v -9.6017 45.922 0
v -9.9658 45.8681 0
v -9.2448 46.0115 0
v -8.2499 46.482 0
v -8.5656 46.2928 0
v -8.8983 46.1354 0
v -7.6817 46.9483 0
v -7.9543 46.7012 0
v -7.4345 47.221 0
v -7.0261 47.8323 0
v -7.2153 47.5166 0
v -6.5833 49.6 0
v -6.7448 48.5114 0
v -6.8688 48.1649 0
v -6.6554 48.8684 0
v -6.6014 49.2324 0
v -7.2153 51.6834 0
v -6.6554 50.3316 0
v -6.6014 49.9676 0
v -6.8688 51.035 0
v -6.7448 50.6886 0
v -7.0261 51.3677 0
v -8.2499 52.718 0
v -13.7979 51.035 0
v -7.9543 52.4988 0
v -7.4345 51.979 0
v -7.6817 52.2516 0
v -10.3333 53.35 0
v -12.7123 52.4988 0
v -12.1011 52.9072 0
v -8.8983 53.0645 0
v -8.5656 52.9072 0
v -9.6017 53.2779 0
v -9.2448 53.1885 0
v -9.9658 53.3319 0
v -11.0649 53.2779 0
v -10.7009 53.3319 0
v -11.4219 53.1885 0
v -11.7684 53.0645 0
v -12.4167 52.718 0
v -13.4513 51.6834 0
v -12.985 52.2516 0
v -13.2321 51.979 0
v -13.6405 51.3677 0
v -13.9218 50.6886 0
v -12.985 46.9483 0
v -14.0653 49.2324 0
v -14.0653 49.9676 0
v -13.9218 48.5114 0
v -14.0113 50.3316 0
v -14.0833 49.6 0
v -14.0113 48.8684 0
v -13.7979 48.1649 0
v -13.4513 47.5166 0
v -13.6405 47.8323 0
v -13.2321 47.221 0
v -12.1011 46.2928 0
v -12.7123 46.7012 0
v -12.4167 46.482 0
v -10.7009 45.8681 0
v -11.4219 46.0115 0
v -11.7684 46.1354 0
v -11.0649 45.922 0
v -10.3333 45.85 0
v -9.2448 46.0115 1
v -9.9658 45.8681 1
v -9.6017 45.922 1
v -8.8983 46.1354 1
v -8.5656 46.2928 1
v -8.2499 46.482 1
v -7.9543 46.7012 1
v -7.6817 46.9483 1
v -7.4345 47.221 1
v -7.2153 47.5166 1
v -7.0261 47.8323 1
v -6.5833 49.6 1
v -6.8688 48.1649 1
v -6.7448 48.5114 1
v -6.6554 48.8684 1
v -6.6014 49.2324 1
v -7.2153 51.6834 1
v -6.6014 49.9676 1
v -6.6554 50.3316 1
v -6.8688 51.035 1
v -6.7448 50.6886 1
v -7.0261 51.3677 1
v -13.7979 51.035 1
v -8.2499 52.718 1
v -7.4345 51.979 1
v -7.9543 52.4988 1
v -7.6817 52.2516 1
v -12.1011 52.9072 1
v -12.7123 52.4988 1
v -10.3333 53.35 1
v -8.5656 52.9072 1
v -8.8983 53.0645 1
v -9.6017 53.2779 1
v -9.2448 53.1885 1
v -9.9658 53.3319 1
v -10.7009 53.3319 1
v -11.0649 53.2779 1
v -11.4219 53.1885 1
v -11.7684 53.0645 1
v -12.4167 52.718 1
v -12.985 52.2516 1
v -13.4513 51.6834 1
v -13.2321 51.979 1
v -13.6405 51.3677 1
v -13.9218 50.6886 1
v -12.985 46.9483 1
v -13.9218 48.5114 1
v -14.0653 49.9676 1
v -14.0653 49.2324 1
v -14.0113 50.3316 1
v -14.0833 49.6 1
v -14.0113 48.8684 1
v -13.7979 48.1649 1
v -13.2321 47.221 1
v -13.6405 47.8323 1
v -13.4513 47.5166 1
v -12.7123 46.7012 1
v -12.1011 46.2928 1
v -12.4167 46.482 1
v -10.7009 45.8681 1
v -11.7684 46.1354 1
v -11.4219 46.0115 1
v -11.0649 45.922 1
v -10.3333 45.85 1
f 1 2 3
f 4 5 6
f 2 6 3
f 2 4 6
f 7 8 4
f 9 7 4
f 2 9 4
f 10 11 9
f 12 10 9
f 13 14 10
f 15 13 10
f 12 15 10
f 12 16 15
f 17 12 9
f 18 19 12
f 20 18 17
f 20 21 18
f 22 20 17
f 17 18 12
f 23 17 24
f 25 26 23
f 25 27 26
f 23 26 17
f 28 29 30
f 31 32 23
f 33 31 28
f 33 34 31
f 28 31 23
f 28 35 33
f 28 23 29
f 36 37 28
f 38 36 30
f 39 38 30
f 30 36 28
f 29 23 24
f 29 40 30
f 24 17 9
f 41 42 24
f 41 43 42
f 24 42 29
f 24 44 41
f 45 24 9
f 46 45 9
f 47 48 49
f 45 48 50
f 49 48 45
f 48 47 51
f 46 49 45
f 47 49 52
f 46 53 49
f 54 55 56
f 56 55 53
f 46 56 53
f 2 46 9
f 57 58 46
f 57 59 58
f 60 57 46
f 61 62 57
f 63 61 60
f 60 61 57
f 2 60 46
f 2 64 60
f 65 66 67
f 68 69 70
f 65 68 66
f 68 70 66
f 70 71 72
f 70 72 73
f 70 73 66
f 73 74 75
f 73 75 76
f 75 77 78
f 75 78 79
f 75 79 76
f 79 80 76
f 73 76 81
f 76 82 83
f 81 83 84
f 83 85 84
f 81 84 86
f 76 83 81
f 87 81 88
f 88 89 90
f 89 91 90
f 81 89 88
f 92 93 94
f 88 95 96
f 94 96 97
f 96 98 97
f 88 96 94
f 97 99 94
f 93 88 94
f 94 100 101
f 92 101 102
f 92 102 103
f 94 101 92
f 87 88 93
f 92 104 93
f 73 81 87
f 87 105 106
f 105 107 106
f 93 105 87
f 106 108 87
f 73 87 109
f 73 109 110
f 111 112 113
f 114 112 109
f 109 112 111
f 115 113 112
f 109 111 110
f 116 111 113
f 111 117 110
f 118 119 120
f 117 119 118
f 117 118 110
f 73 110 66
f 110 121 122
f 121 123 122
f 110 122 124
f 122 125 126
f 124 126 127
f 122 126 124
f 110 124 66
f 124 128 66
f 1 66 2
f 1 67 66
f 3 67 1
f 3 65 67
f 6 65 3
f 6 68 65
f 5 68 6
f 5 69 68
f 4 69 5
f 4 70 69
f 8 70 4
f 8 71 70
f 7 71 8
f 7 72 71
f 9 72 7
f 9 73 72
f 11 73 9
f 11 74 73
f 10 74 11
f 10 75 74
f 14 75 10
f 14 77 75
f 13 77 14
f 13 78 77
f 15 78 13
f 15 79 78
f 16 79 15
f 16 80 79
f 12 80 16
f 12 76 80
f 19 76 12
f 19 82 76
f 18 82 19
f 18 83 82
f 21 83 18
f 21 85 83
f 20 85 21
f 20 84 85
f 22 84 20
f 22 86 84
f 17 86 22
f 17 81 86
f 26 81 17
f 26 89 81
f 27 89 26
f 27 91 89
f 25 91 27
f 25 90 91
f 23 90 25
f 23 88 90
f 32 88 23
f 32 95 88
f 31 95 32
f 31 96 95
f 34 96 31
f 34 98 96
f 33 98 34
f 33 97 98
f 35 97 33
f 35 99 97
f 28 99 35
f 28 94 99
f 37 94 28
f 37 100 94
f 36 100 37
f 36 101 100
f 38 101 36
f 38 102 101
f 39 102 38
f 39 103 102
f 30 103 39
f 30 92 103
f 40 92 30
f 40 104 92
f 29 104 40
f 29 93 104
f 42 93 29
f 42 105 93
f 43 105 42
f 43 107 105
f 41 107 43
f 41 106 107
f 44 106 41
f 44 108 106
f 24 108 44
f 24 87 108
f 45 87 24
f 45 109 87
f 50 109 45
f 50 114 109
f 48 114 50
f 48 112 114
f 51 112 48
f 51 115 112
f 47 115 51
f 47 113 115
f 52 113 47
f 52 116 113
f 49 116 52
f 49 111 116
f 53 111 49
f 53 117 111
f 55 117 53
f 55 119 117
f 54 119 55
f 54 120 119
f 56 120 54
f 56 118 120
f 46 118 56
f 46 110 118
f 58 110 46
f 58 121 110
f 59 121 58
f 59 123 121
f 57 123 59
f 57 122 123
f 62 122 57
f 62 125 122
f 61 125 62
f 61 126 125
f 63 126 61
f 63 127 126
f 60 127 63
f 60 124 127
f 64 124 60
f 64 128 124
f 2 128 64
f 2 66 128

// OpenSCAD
/* ==========================================================================

   Parametric Themed Name Sign and Keychain
   Designed by Notydesign
   License: CC BY-NC-SA 4.0 (https://creativecommons.org/licenses/by-nc-sa/4.0/)
   Source: https://github.com/Noty-design/Parametric-designs

   DESCRIPTION
   -----------
   Customizable raised-letter sign with a rounded Spider-Man theme or a
   pixel-corner Minecraft theme, or three unicorn layouts. Each supports a door sign or a
   keychain, optional mounting holes, and separately colored relief layers.

   All dimensions are in millimeters. X runs along the sign, Y is its height,
   and Z is the extrusion direction (the back of the sign is at Z = 0).
   Colors are for preview and compatible multicolor export workflows; an STL
   does not store colors.

   This file is deliberately documented for safe parameter and geometry edits.
   ========================================================================== */

/* [Main settings] */
// The displayed name; leave empty for a sign with decorative graphics only.
name_text = "ELLA";
// Select a wall/door sign or a keychain with an integral attachment tab.
plate_type = "door_sign"; // [door_sign:Door sign, keychain:Keychain]
// Select the theme used for the base outline and raised graphics.
theme = "unicorn"; // [spiderman:Spider-Man, minecraft:Minecraft, unicorn:Unicorn]

/* [Unicorn graphics] */
// Select the complete unicorn silhouette, a head above the sign, or an inset motif.
unicorn_variant = "full_horse"; // [full_horse:Full unicorn, head_top:Head above sign, inside:Unicorn inside sign]
// Display small decorative sparkles.
unicorn_show_stars = true;
// Select the facial expression for every unicorn layout.
unicorn_eye_style = "closed"; // [closed:Closed eyes, open:Open eyes]
// Add a small swept eyelash to either eye expression.
unicorn_eye_lashes = true;
// Choose an attached loop or a hole in the artwork. Neck and mane use layout-specific anchors.
unicorn_keyhole_position = "loop"; // [loop:External loop, neck:Neck, mane:Mane]
// Move the hole or loop horizontally (mm). For an integrated hole, keep enough material around it.
unicorn_keyhole_offset_x = 0; // [-30:0.5:30]
// Move the hole or loop vertically (mm).
unicorn_keyhole_offset_y = 0; // [-30:0.5:30]
// Horizontal name position adjustment (mm).
unicorn_text_offset_x = 0; // [-40:0.5:40]
// Vertical name position adjustment (mm).
unicorn_text_offset_y = 0; // [-25:0.5:25]
// Relative size of the head for the two plate layouts.
unicorn_motif_scale = 100; // [70:5:120]

/* [Spider-Man graphics] */
// Select the stylized spider emblem or mask motif.
spiderman_motif = "emblem"; // [emblem:Spider emblem, mask:Mask]
// Motif size relative to its theme-specific reference size; zero hides it.
motif_scale_percent = 0; // [0:5:220]
// Horizontal offset of the motif (mm).
motif_offset_x = 0; // [-70:1:70]
// Vertical offset of the motif (mm).
motif_offset_y = 0; // [-20:1:20]
// Show the clipped radial web behind the name and motif.
show_spider_web = true;
// Horizontal adjustment of the name (mm).
spiderman_text_offset_x = 0; // [-40:0.5:40]
// Vertical adjustment of the name (mm).
spiderman_text_offset_y = 0; // [-25:0.5:25]

/* [Minecraft text] */
// Horizontal adjustment of the name (mm).
minecraft_text_offset_x = 0; // [-40:0.5:40]
// Vertical adjustment of the name (mm).
minecraft_text_offset_y = 0; // [-25:0.5:25]
// Keep moved text within the reserved text zone; disable for free placement.
minecraft_limit_text_position = true;

/* [Dimensions and mounting] */
// Derive plate width from the text-length estimate and use a preset height.
auto_size = true;
// Plate width when automatic sizing is disabled (mm).
manual_width = 140; // [50:5:250]
// Plate height when automatic sizing is disabled (mm).
manual_height = 48; // [20:2:100]
// Thickness of the backing plate (mm).
base_thickness = 3.2; // [2.0:0.2:8.0]
// Maximum height of raised text and decoration above the backing plate (mm).
relief_height = 1.5; // [0.6:0.2:3.0]
// Add two countersunk mounting holes to a door sign; ignored for keychains.
mount_holes = false;
// Through-hole diameter (mm).
hole_diameter = 4; // [2.5:0.5:6.0]

/* [Colors and appearance] */
// Apply the theme's default palette instead of the custom colors below.
use_theme_palette = true;
// Custom backing-plate color.
custom_base_color = "#C62828";
// Custom border, web, and emblem color.
custom_detail_color = "#141414";
// Custom raised-letter color.
custom_text_color = "#FFFFFF";
// Custom eye and experience-bar color.
custom_accent_color = "#FFFFFF";

/* [Hidden] */
// Facet count affects circles and rounded edges only.
$fn = 48;

// Keep the theme palette values in one place for easy restyling.
spidey_base   = "#C62828";
spidey_detail = "#141414";
spidey_text   = "#FFFFFF";
spidey_accent = "#FFFFFF";
mc_base       = "#2E7D32";
mc_detail     = "#151515";
mc_text       = "#FFFFFF";
mc_accent     = "#81C784";

base_color   = use_theme_palette ? (theme == "spiderman" ? spidey_base   : mc_base)   : custom_base_color;
detail_color = use_theme_palette ? (theme == "spiderman" ? spidey_detail : mc_detail) : custom_detail_color;
text_color   = use_theme_palette ? (theme == "spiderman" ? spidey_text   : mc_text)   : custom_text_color;
accent_color = use_theme_palette ? (theme == "spiderman" ? spidey_accent : mc_accent) : custom_accent_color;

is_keychain = plate_type == "keychain";
has_text = len(name_text) > 0;
plate_h = auto_size ? (is_keychain ? 28 : 50) : manual_height;
font_size = is_keychain ? min(13, plate_h * 0.44) : min(25, plate_h * 0.46);

// Approximate name width conservatively: the chosen font has variable glyph widths.
est_text_w = has_text ? max(1, len(name_text)) * font_size * 0.65 : 0;
mount_margin = (!is_keychain && mount_holes) ? 26 : 0;
badge_w = theme == "minecraft" ? (is_keychain ? 24 : 44) : (is_keychain ? 16 : 28);
auto_w = has_text
    ? max(is_keychain ? 65 : 125,
          badge_w + est_text_w + (is_keychain ? 16 : 28) + mount_margin)
    : (is_keychain ? 70 : 135);
plate_w = auto_size ? auto_w : manual_width;
border_w = is_keychain ? 1.5 : 2.5;
corner_radius = min(8, plate_h * 0.25);

// Reference motif heights (90 mm for the emblem, 42 mm for the mask) keep
// both motifs proportional to the chosen sign height.
motif_reference_h = spiderman_motif == "emblem" ? 90 : 42;
motif_height_fraction = spiderman_motif == "emblem"
    ? (is_keychain ? 0.82 : 0.88)
    : (is_keychain ? 0.78 : 0.84);
spidey_motif_scale = motif_scale_percent / 100 * plate_h * motif_height_fraction / motif_reference_h;

// Shared Minecraft coordinates prevent the detail outline and accent fill
// from drifting apart when dimensions or margins change.
function creeper_x() = -plate_w / 2 + (is_keychain ? 16 : 26);
function xp_x() = creeper_x() + (is_keychain ? 14 : 26);
function xp_width() = plate_w / 2 - xp_x()
    - (is_keychain ? 6 : (mount_holes ? 18 : 10));
function xp_y() = -plate_h / 2 + (is_keychain ? 5.5 : 8.5);
function xp_height() = is_keychain ? 2.2 : 3.6;
function text_position() = theme == "spiderman" ? [0, 0] : [
    ((-plate_w / 2 + (is_keychain ? 24 : 44))
     + (plate_w / 2 - (is_keychain ? 4 : (mount_holes ? 18 : 8)))) / 2,
    is_keychain ? 3.0 : 4.5
];

assert(plate_w > 2 * corner_radius && plate_h > 2 * corner_radius,
       "Plate dimensions must exceed twice the corner radius.");
assert(base_thickness > 0 && relief_height > 0,
       "Both extrusion heights must be positive.");
assert(hole_diameter > 0 && hole_diameter < plate_h,
       "Mounting-hole diameter must fit within the plate height.");

// --------------------------------------------------------------------------
// Model assembly: combine color-coded layers before subtracting all holes.
// --------------------------------------------------------------------------
if (theme == "unicorn") unicorn_nametag();
else nametag();

module nametag() {
    difference() {
        union() {
            color(base_color)
                linear_extrude(height = base_thickness)
                    base_plate_shape();

            color(detail_color)
                translate([0, 0, base_thickness])
                    linear_extrude(height = relief_height * 0.65)
                        details_layer_2d();

            color(accent_color)
                translate([0, 0, base_thickness])
                    linear_extrude(height = relief_height * 0.75)
                        accent_layer_2d();

            if (has_text) {
                // Dark outline is used for Spider-Man; Minecraft has no outline.
                if (theme == "spiderman")
                    color(detail_color)
                        translate([0, 0, base_thickness])
                            linear_extrude(height = relief_height * 0.88)
                                text_outline_2d();

                color(text_color)
                    translate([0, 0, base_thickness])
                        linear_extrude(height = relief_height)
                            text_core_2d();
            }
        }
        cutouts();
    }
}

// --------------------------------------------------------------------------
// Base and inner outlines for the two themes.
// --------------------------------------------------------------------------
module base_plate_shape() {
    if (theme == "minecraft") minecraft_plate_2d();
    else spiderman_plate_2d();
}

module inner_plate_shape() {
    if (theme == "minecraft") minecraft_plate_inner_2d();
    else spiderman_plate_inner_2d();
}

module spiderman_plate_2d() {
    union() {
        // Expand a centered rectangle to produce a plate with round corners.
        offset(r = corner_radius)
            square([plate_w - 2 * corner_radius,
                    plate_h - 2 * corner_radius], center = true);
        if (is_keychain)
            translate([-plate_w / 2 - 2, 0]) circle(d = 12);
    }
}

module spiderman_plate_inner_2d() {
    offset(r = corner_radius - border_w)
        square([plate_w - 2 * corner_radius,
                plate_h - 2 * corner_radius], center = true);
}

module minecraft_plate_2d() {
    step_size = is_keychain ? 2.5 : 4.5;
    union() {
        difference() {
            square([plate_w, plate_h], center = true);
            // The asymmetrical cutouts create a blocky pixel-corner pattern.
            for (sx = [-1, 1], sy = [-1, 1])
                translate([sx * plate_w / 2, sy * plate_h / 2]) {
                    translate([-sx * step_size * 0.5, -sy * step_size * 0.5])
                        square([step_size, step_size], center = true);
                    translate([-sx * step_size * 1.5, -sy * step_size * 0.25])
                        square([step_size, step_size * 0.5], center = true);
                    translate([-sx * step_size * 0.25, -sy * step_size * 1.5])
                        square([step_size * 0.5, step_size], center = true);
                }
        }
        if (is_keychain)
            translate([-plate_w / 2 - 2, 0]) square([11, 11], center = true);
    }
}

module minecraft_plate_inner_2d() {
    step_size = is_keychain ? 2.5 : 4.5;
    inner_w = plate_w - 2 * border_w;
    inner_h = plate_h - 2 * border_w;
    difference() {
        square([inner_w, inner_h], center = true);
        for (sx = [-1, 1], sy = [-1, 1])
            translate([sx * inner_w / 2, sy * inner_h / 2])
                translate([-sx * step_size * 0.5, -sy * step_size * 0.5])
                    square([step_size, step_size], center = true);
    }
}

// Cut through the keychain tab or the two door-sign mounting positions.
module cutouts() {
    if (is_keychain) {
        translate([-plate_w / 2 - 2, 0, -1])
            cylinder(h = base_thickness + relief_height + 2, d = 4.5);
    } else if (mount_holes) {
        hole_x = plate_w / 2 - 9;
        for (sx = [-1, 1])
            translate([sx * hole_x, 0, -1]) {
                cylinder(h = base_thickness + 2, d = hole_diameter);
                // Two-level conical recess, measured from its bottom.
                translate([0, 0, base_thickness - 1.2])
                    cylinder(h = relief_height + 2,
                             d1 = hole_diameter, d2 = hole_diameter + 3.5);
            }
    }
}

// --------------------------------------------------------------------------
// Raised border and the chosen theme's dark graphical elements.
// --------------------------------------------------------------------------
module details_layer_2d() {
    difference() {
        base_plate_shape();
        inner_plate_shape();
    }
    if (theme == "spiderman") spiderman_theme_details();
    else minecraft_theme_details();
}

module spiderman_theme_details() {
    if (show_spider_web)
        intersection() {
            if (is_keychain || (spiderman_motif == "emblem" && motif_scale_percent > 0)) offset(delta=-0.02) inner_plate_shape(); else inner_plate_shape();
            spiderman_web_rays();
        }

    if (motif_scale_percent > 0)
        if (spiderman_motif == "emblem")
            intersection() {
                inner_plate_shape();
                translate([motif_offset_x, motif_offset_y])
                    scale([spidey_motif_scale, spidey_motif_scale])
                        insomniac_spider_emblem_2d();
            }
        else
            translate([motif_offset_x, motif_offset_y])
                scale([spidey_motif_scale, spidey_motif_scale])
                    spiderman_mask_details_2d();
}

// Stylized eight-legged emblem. The four right-side leg polygons are
// mirrored to the left to avoid duplicating their coordinates.
module insomniac_spider_emblem_2d() {
    union() {
        // Head and mandibles.
        polygon(points = [
            [0,16.5],[1.0,19.0],[2.4,21.6],[3.6,17.8],[3.8,15.0],
            [-3.8,15.0],[-3.6,17.8],[-2.4,21.6],[-1.0,19.0]
        ]);
        // Thorax.
        polygon(points = [
            [3.8,15.0],[5.4,11.5],[5.6,7.5],[4.6,4.0],
            [-4.6,4.0],[-5.6,7.5],[-5.4,11.5],[-3.8,15.0]
        ]);
        // Tapered abdomen with a small central bottom notch.
        polygon(points = [
            [4.4,4.0],[5.6,0.5],[5.8,-3.5],[4.8,-8.5],[3.2,-13.0],
            [1.5,-15.8],[0,-14.2],[-1.5,-15.8],[-3.2,-13.0],
            [-4.8,-8.5],[-5.8,-3.5],[-5.6,0.5],[-4.4,4.0]
        ]);
    }

    for (side = [0, 1]) mirror([side, 0, 0]) {
        // Upper inner leg.
        polygon(points = [[3.6, 15.0], [4.2, 16.6], [11.8, 25.8], [13.4, 29.5], [15.2, 38.0], [16.2, 45.0], [15.0, 36.5], [13.8, 28.5], [14.2, 22.8], [11.2, 21.8], [10.0, 23.5], [4.2, 13.8]]);
        // Upper outer leg.
        polygon(points = [[4.6, 12.8], [5.2, 14.2], [18.5, 24.8], [25.8, 28.5], [27.0, 36.5], [26.2, 26.5], [23.8, 17.5], [22.8, 18.8], [17.2, 22.2], [5.0, 10.6]]);
        // Lower outer leg.
        polygon(points = [
            [5.0,9.2],[5.5,10.4],[24.5,3.2],[28.5,-0.5],
            [23.5,-16.5],[19.5,-32.5],[21.2,-22.0],[24.8,-10.5],
            [26.5,-0.5],[22.8,2.0],[5.2,7.4]
        ]);
        // Lower inner leg.
        polygon(points = [
            [4.8,6.0],[5.2,7.2],[17.5,-4.5],[15.2,-18.0],
            [12.8,-32.0],[10.5,-45.0],[12.2,-33.0],[14.5,-19.0],
            [16.0,-5.5],[4.6,4.4]
        ]);
    }
}

// Mask contour, eye rims, and fine web lines.
module spiderman_mask_details_2d() {
    difference() {
        spiderman_head_contour();
        offset(r = -1.5) spiderman_head_contour();
    }
    for (side = [0, 1]) mirror([side, 0, 0]) spiderman_eye_rim();
    intersection() {
        spiderman_head_contour();
        union() {
            square([1.1, 46], center = true);
            for (angle = [24, 48, 72, 108, 132, 156])
                rotate([0, 0, angle]) square([44, 0.9], center = true);
            for (radius = [6, 12, 18, 24])
                difference() {
                    circle(r = radius);
                    circle(r = radius - 0.8);
                }
        }
    }
}

// Radial rays and concentric rings, cropped to the inner plate at call site.
module spiderman_web_rays() {
    line_w = is_keychain ? 0.7 : 1.1;
    max_diag = sqrt(plate_w * plate_w + plate_h * plate_h);
    translate([motif_offset_x, motif_offset_y]) {
        for (angle = [0:20:359])
            rotate([0, 0, angle])
                translate([0, -line_w / 2])
                    square([max_diag, line_w]);
        ring_spacing = is_keychain ? 5.5 : 9.0;
        for (ring_radius = [ring_spacing:ring_spacing:max_diag / 2])
            difference() {
                circle(r = ring_radius);
                circle(r = ring_radius - line_w);
            }
    }
}

module spiderman_head_contour() {
    hull() {
        translate([0, 5]) circle(r = 13);
        translate([0, -8]) circle(r = 9);
        translate([0, -15]) circle(r = 4.8);
    }
}

module spiderman_eye_rim() {
    polygon(points = [
        [2.0,-1.2],[3.4,4.2],[12.0,9.8],[15.0,7.2],
        [11.5,0.4],[5.2,-5.6],[2.4,-4.8]
    ]);
}

module spiderman_eye_white() {
    polygon(points = [
        [3.0,-0.8],[4.2,3.4],[11.0,8.0],[13.2,6.2],
        [10.2,0.8],[5.4,-4.2],[3.3,-3.6]
    ]);
}

// --------------------------------------------------------------------------
// Minecraft motif: an eight-cell Creeper face and a framed experience bar.
// --------------------------------------------------------------------------
module minecraft_theme_details() {
    pixel = is_keychain ? 1.8 : 3.4;
    translate([creeper_x(), 0]) {
        // One-cell border around the face grid.
        difference() {
            square([8 * pixel + 1.4, 8 * pixel + 1.4], center = true);
            square([8 * pixel, 8 * pixel], center = true);
        }
        translate([-4 * pixel, -4 * pixel]) {
            translate([1 * pixel, 4 * pixel]) square([2 * pixel, 2 * pixel]);
            translate([5 * pixel, 4 * pixel]) square([2 * pixel, 2 * pixel]);
            // Overlap the eye corners to avoid point-only pixel contacts.
            translate([3 * pixel - 0.02, 3 * pixel]) square([2 * pixel + 2 * 0.02, pixel + 0.02]);
            translate([2 * pixel, 1 * pixel]) square([4 * pixel, 2 * pixel]);
            translate([2 * pixel, 0 * pixel]) square([1 * pixel, 1 * pixel]);
            translate([5 * pixel, 0 * pixel]) square([1 * pixel, 1 * pixel]);
        }
    }
    if (xp_width() > 15)
        translate([xp_x() + xp_width() / 2, xp_y()]) {
            difference() {
                square([xp_width(), xp_height()], center = true);
                square([xp_width() - 0.9, xp_height() - 0.9], center = true);
            }
            tick_count = floor(xp_width() / (is_keychain ? 6 : 10));
            for (i = [1:tick_count])
                translate([-xp_width() / 2 + i * xp_width() / (tick_count + 1), 0])
                    square([0.6, xp_height()], center = true);
        }
}

// Raised accent graphics: white eye lenses or the green XP-bar fill.
module accent_layer_2d() {
    if (theme == "spiderman") {
        if (spiderman_motif == "mask" && motif_scale_percent > 0)
            translate([motif_offset_x, motif_offset_y])
                scale([spidey_motif_scale, spidey_motif_scale])
                    for (side = [0, 1])
                        mirror([side, 0, 0]) spiderman_eye_white();
    } else if (xp_width() > 15) {
        translate([xp_x() + xp_width() / 2, xp_y()])
            square([xp_width() - 1.2, xp_height() - 1.2], center = true);
    }
}

// Theme-specific fonts provide consistent text layouts.
// Approximate advances of the selected Liberation Sans Bold font, in cap-height units.
mc_glyphs = "ABCDEFGHIJKLMNOPQRSTUVWXYZabcdefghijklmnopqrstuvwxyz0123456789 -_ÅÄÖåäöÉé.";
mc_advances = [1.05, 1.05, 1.05, 1.05, 0.969, 0.888, 1.131, 1.05, 0.404, 0.808, 1.05, 0.888, 1.211, 1.05, 1.131, 0.969, 1.131, 1.05, 0.969, 0.888, 1.05, 0.969, 1.372, 0.969, 0.969, 0.888, 0.808, 0.888, 0.808, 0.888, 0.808, 0.484, 0.888, 0.888, 0.404, 0.404, 0.808, 0.404, 1.292, 0.888, 0.888, 0.888, 0.888, 0.566, 0.808, 0.484, 0.888, 0.808, 1.131, 0.808, 0.808, 0.727, 0.808, 0.808, 0.808, 0.808, 0.808, 0.808, 0.808, 0.808, 0.808, 0.808, 0.404, 0.484, 0.808, 1.05, 1.05, 1.131, 0.808, 0.808, 0.888, 0.969, 0.808, 0.404];
function mc_glyph_width(c) =
    let(matches=search(c,mc_glyphs,1))
    len(matches)>0 ? mc_advances[matches[0]] : 1.6;
function mc_name_units(i=0) =
    i>=len(name_text) ? 0 : mc_glyph_width(name_text[i])+mc_name_units(i+1);
function mc_text_left() = max(-plate_w/2+(is_keychain?24:44),
    creeper_x()+(is_keychain?8:14.5)+1.2);
function mc_text_right() = plate_w/2-(is_keychain?4:(mount_holes?18:8));
function mc_text_available() = max(1,mc_text_right()-mc_text_left());

// The text positions are relative to each theme's established layout.
// At zero offset, no clipping or automatic repositioning is applied.
module text_core_2d() {
    font_choice = theme == "spiderman"
        ? "Liberation Sans:style=Bold Italic"
        : "Liberation Sans:style=Bold";
    if (theme == "minecraft") {
        available = mc_text_available();
        fitted_size = min(font_size, available / max(0.1, mc_name_units() * 1.03));
        center_x = (mc_text_left() + mc_text_right()) / 2;
        center_y = text_position()[1];
        estimated_half_w = min(available / 2, mc_name_units() * fitted_size * 1.03 / 2);
        x_min = mc_text_left() + estimated_half_w;
        x_max = mc_text_right() - estimated_half_w;
        y_min = max(-plate_h / 2 + border_w + fitted_size * 0.55,
                    xp_y() + xp_height() / 2 + fitted_size * 0.55 + 0.8);
        y_max = plate_h / 2 - border_w - fitted_size * 0.55;
        x_requested = center_x + minecraft_text_offset_x;
        y_requested = center_y + minecraft_text_offset_y;
        // Zero offsets exactly preserve the accepted geometry, even if a
        // manually undersized plate leaves no safe movement interval.
        x_final = !minecraft_limit_text_position || minecraft_text_offset_x == 0
            ? x_requested : (x_min <= x_max ? min(max(x_requested, x_min), x_max) : center_x);
        y_final = !minecraft_limit_text_position || minecraft_text_offset_y == 0
            ? y_requested : (y_min <= y_max ? min(max(y_requested, y_min), y_max) : center_y);
        translate([x_final, y_final])
            text(text = name_text, size = fitted_size, font = font_choice,
                 halign = "center", valign = "center");
    } else
        translate([text_position()[0] + spiderman_text_offset_x,
                   text_position()[1] + spiderman_text_offset_y])
            text(text = name_text, size = font_size, font = font_choice,
                 halign = "center", valign = "center");
}

// Expand the final positioned text once to keep the outline aligned.
module text_outline_2d() {
    if (theme == "spiderman")
        offset(r = is_keychain ? 1.0 : 1.6)
            text_core_2d();
}


// ==========================================================================
// UNICORN THEME
// Self-contained geometry: the original two themes remain unchanged.
// Curved outlines are sampled from cubic Bezier segments. No external SVGs,
// font icons, or mesh imports are required.
// ==========================================================================
function u_bezier(p0,p1,p2,p3,t) =
    (1-t)*(1-t)*(1-t)*p0 + 3*(1-t)*(1-t)*t*p1 +
    3*(1-t)*t*t*p2 + t*t*t*p3;

module u_curve(start,segments) {
    polygon(concat([start],[
        for(i=[0:len(segments)-1], j=[1:12])
            u_bezier(i==0?start:segments[i-1][2],
                segments[i][0],segments[i][1],segments[i][2],j/12)
    ]));
}

module u_stroke(points,w=1.8) {
    for(i=[0:len(points)-2])
        hull() {
            translate(points[i]) circle(d=w,$fn=20);
            translate(points[i+1]) circle(d=w,$fn=20);
        }
}

module u_sparkle(r=3) {
    polygon([for(i=[0:7]) let(a=90+i*45,rr=i%2==0?r:r*0.31)
        [rr*cos(a),rr*sin(a)]]);
}



















// A tiny geometric seed survives only when the complete star fits.
// Hulls reconstruct its eight wedges instead of clipping the star itself.
module u_star_seed(p,r) {
    intersection() {
        square([0.02,0.02],center=true);
        translate(-p) offset(r=-(r+0.05/u_fs)) u_horse_star_space();
    }
}
function u_star_point(r,i) =
    let(a=90+i*45,rr=i%2==0?r:r*0.31) [rr*cos(a),rr*sin(a)];
module u_whole_star(p,r) {
    if (r*u_fs >= 1.4)
        translate(p)
            for (i=[0:7])
                hull() {
                    u_star_seed(p,r);
                    translate(u_star_point(r,i)) u_star_seed(p,r);
                    translate(u_star_point(r,i+1)) u_star_seed(p,r);
                }
}


// Layout values are independent of the Spider-Man/Minecraft calculations.
u_full = unicorn_variant=="full_horse";
u_top = unicorn_variant=="head_top";
u_inside = unicorn_variant=="inside";
u_chars = max(1,len(name_text));
u_h = auto_size ? (is_keychain?28:50) : manual_height;
u_mount = !is_keychain && mount_holes;
u_border = is_keychain?1.4:2.2;
u_r = min(u_h/4,8);
u_head_ref_h = 56;
u_head_ref_w = 76;
u_width = auto_size ?
    (u_full ? (is_keychain?max(72,min(115,50+u_chars*4)):
                 max(155,min(250,105+u_chars*12))) :
        max(is_keychain?70:125,
            (is_keychain?9:16)*u_chars*.85+
            (u_inside?(is_keychain?28:44):0)+
            (u_mount?36:20))) : manual_width;
// Full horse has a fixed aspect ratio; manual width controls its total size.
u_fs = (u_full && is_keychain ? max(72,u_width) : u_width)/150;
u_factor = unicorn_motif_scale/100;
u_hs = u_top ? min(u_h*.95/u_head_ref_h*u_factor,u_width*.68/u_head_ref_w) :
    min((u_h-2*(u_border+2))/u_head_ref_h*u_factor,u_width*.36/u_head_ref_w);
u_left = -u_width/2+(u_mount?17:0)+u_border+3;
u_head_x = u_top?0:u_left+38*u_hs;
u_head_y = u_top?u_h/2-5:-24*u_hs;
u_text_left = u_inside?u_head_x+38*u_hs+4:
    -u_width/2+u_border+(u_mount?16:5);
u_text_right = u_width/2-u_border-(u_mount?16:5);
u_text_w = max(1,u_text_right-u_text_left);
u_text_x = (u_full?-3*u_fs:(u_text_left+u_text_right)/2) + unicorn_text_offset_x;
u_text_y = (u_full?3*u_fs:0) + unicorn_text_offset_y;
u_font = u_full?min(18,(u_mount?52:70)/u_chars)*u_fs:
    min(u_h*.44,u_text_w/(u_chars*.88));
u_outline = is_keychain?.55:.85;

u_base_color = use_theme_palette?"#FBE7F4":custom_base_color;
u_dark_color = use_theme_palette?"#653884":custom_detail_color;
u_name_color = use_theme_palette?"#FFFFFF":custom_text_color;
u_gold_color = use_theme_palette?"#F2B84D":custom_accent_color;

module u_scaled_head() {
    translate([u_head_x,u_head_y]) scale([u_hs,u_hs]) children();
}
module u_scaled_horse() {
    scale([u_fs,u_fs]) children();
}
module u_round_plate() {
    offset(r=u_r) square([u_width-2*u_r,u_h-2*u_r],center=true);
}
// Keychain attachment anchors and adjustable hole location.
function u_keyhole_anchor() = u_full ?
    [-24,36]*u_fs : [-u_width/2+4,0];
function u_keyhole_default() =
    unicorn_keyhole_position=="loop" ?
        (u_full ? [-10,48]*u_fs : [-u_width/2-2,0]) :
    u_full ?
        (unicorn_keyhole_position=="mane" ? [-20,36] : [-24,30])*u_fs :
        [u_head_x,u_head_y]+
            (unicorn_keyhole_position=="mane" ? [17.5,10] : [13.5,6])*u_hs;
function u_keyhole_xy() = u_keyhole_default()+
    [unicorn_keyhole_offset_x,unicorn_keyhole_offset_y];

// Connect the movable loop to a stable anchor; the 12 mm boss has a 4.5 mm hole.
module u_keychain_loop() {
    hull() {
        translate(u_keyhole_anchor()) circle(d=7.5,$fn=64);
        translate(u_keyhole_xy()) circle(d=12,$fn=64);
    }
}
module u_base() {
    union() {
        if(u_full) u_scaled_horse() u_horse_shape();
        else {
            u_round_plate();
            if(u_top) u_scaled_head() u_head_shape();
        }
        if(is_keychain && unicorn_keyhole_position=="loop") u_keychain_loop();
    }
}
module u_border_shape() {
    difference() {
        u_round_plate();
        offset(delta=-u_border) u_round_plate();
        if(u_top) u_scaled_head() u_head_shape();
    }
}
module u_name() {
    translate([u_text_x,u_text_y])
        text(name_text,size=u_font,font="Liberation Sans:style=Bold",
            halign="center",valign="center");
}
module u_dark() {
    // Close tangential contacts in the assembled inset artwork.
    if (u_inside) offset(delta=-0.16) offset(delta=0.16) u_dark_raw();
    else u_dark_raw();
}
module u_dark_raw() {
    if(u_full) u_scaled_horse() u_horse_dark();
    else {
        u_border_shape();
        u_scaled_head() u_head_dark();
    }
    if(has_text) offset(r=u_outline) u_name();
}
module u_gold() {
    if(u_full) u_scaled_horse() u_horse_gold();
    else {
        u_scaled_head() u_head_gold();
        if(unicorn_show_stars && u_h>=26) {
            translate([u_text_x-u_text_w*.32,-u_h/2+u_border+4])
                u_sparkle(is_keychain?1.8:2.8);
            translate([u_text_x+u_text_w*.32,u_h/2-u_border-4])
                u_sparkle(is_keychain?1.8:2.8);
        }
    }
}
module u_highlights() {
    if(u_full) u_scaled_horse() u_horse_highlights();
    else u_scaled_head() u_head_highlights();
}
module u_holes() {
    if(is_keychain)
        translate(concat(u_keyhole_xy(),[-1]))
            cylinder(h=base_thickness+relief_height+2,d=4.5,$fn=64);
    else if(mount_holes)
        for(x=u_full?[-23*u_fs,23*u_fs]:[-u_width/2+9,u_width/2-9])
            translate([x,u_full?-2*u_fs:0,-1])
                cylinder(h=base_thickness+relief_height+2,d=hole_diameter);
}
module u_clipped() {
    intersection() { u_base(); children(); }
}
module unicorn_nametag() {
    linear_extrude(height=1) difference() {
        translate(u_keyhole_xy()) circle(r=3.75,$fn=64);
        u_base();
    }
}


// Complete unicorn silhouette and matching relief artwork.
module u_horse_shape() {
    offset(r=0.35) offset(delta=-0.35)
        polygon([[-75,71.64],[-50.48,50.37],[-52.33,47.97],[-53.8,47.58],[-52.02,46.50],[-49.63,46.73],[-49.86,44.49],[-48.08,42.01],[-50.86,34.28],[-52.49,32.58],[-53.34,30.64],[-53.18,27.47],[-51.87,25.30],[-49.24,24.38],[-46.69,24.92],[-45.53,26.16],[-44.91,28.09],[-40.58,29.87],[-35.86,34.51],[-33.46,32.50],[-32.14,29.79],[-31.83,26.23],[-32.53,22.75],[-36.55,14.40],[-37.48,11.38],[-37.48,8.36],[-35.70,2.17],[-35.86,0.16],[-36.78,-0.46],[-45.68,0.16],[-50.86,-0.30],[-51.95,-1.77],[-54.27,-8.97],[-57.67,-15.77],[-54.58,-26.84],[-53.57,-27.53],[-51.56,-25.91],[-50.71,-23.51],[-51.10,-20.11],[-51.64,-19.41],[-53.26,-19.41],[-53.26,-18.25],[-49.94,-9.12],[-47.46,-5.25],[-43.21,-6.10],[-32.84,-10.20],[-28.74,-8.50],[-27.58,-8.50],[-25.64,-10.51],[-24.72,-14.15],[-24.79,-18.17],[-26.11,-23.12],[-29.13,-30.08],[-29.20,-34.88],[-33.46,-45.40],[-37.71,-50.82],[-39.03,-54.53],[-33.38,-55.30],[-31.83,-54.92],[-31.37,-52.91],[-31.83,-50.12],[-29.59,-47.65],[-28.82,-41.61],[-23.71,-33.33],[-22.55,-28.46],[-19.77,-22.50],[-17.14,-14.23],[-6.46,-14.07],[2.75,-12.99],[6.54,-18.09],[8.86,-25.91],[12.96,-35.11],[12.88,-39.29],[10.64,-46.33],[8.86,-49.97],[6.30,-51.98],[4.68,-55.92],[10.25,-55.77],[10.87,-53.29],[11.87,-52.67],[13.04,-50.58],[19.30,-33.49],[18.99,-31.24],[16.21,-26.22],[15.05,-21.03],[15.51,-16.16],[18.14,-8.27],[19.15,-7.50],[32.61,-17.63],[36.17,-21.03],[44.13,-33.41],[46.92,-42.38],[50.32,-48.73],[54.65,-53.14],[56.36,-52.21],[57.75,-50.04],[57.59,-47.88],[55.58,-45.01],[53.18,-44.63],[46.53,-30.24],[44.75,-22.58],[42.28,-20.57],[39.41,-15.15],[37.79,-10.51],[37.48,-5.64],[36.47,-1.07],[32.22,10.68],[34,10.22],[35.31,8.90],[36.86,2.72],[40.11,-1.46],[45.84,-5.10],[51.17,-6.88],[52.10,-11.05],[55.20,-15.23],[57.75,-16.93],[61.38,-18.09],[64.25,-17.78],[66.18,-15.85],[68.73,-16.39],[71.36,-19.33],[72.45,-24.36],[73.84,-22.74],[74.69,-20.26],[74.38,-16.86],[72.45,-12.91],[74.69,-10.13],[74.54,-6.64],[73.76,-5.25],[70.59,-8.50],[67.96,-9.58],[66.10,-9.43],[63.86,-8.04],[63.16,-6.57],[63.40,-0.46],[62,3.41],[59.30,6.35],[55.20,7.98],[57.28,8.83],[58.29,10.14],[58.60,12.54],[57.83,15.56],[56.20,12.70],[54.27,12.70],[52.33,14.86],[49.24,20.35],[47.46,21.82],[44.44,22.75],[40.88,22.67],[37.33,21.75],[34.85,20.28],[31.52,17.26],[28.74,16.56],[24.10,19.81],[18.45,21.13],[11.33,20.90],[0.19,18.96],[-2.20,22.06],[-4.37,22.67],[-6.69,22.60],[-7.77,23.37],[-7.54,33.66],[-8.86,36.83],[-11.10,39.38],[-9.01,40.62],[-8.08,43.41],[-8.78,42.56],[-10.33,42.17],[-13.27,42.48],[-14.74,43.17],[-16.05,44.80],[-18.06,49.44],[-19.53,51.14],[-23.32,53.08],[-26.96,53.39],[-26.26,54.31],[-26.26,55.63],[-27.58,57.80],[-30.44,58.88],[-29.36,57.56],[-29.28,56.25],[-30.29,54.93],[-31.52,54.47],[-37.64,55.01],[-40.19,54.24],[-44.37,56.71],[-43.98,55.09],[-44.29,52.23]]);
}
module u_horse_horn() {
    intersection() {
        u_horse_shape();
        polygon([[-80,75],[-43,52],[-50,49],[-76,67]]);
    }
}
module u_horse_mane() {
    intersection() {
        u_horse_shape();
        u_curve([-54,47],[
            [[-49,56],[-41,60],[-32,60]],
            [[-13,61],[-5,48],[-5,38]],
            [[-4,30],[-5,24],[1,19]],
            [[-9,16],[-18,24],[-20,32]],
            [[-23,43],[-30,48],[-37,48]],
            [[-42,47],[-48,42],[-54,47]]
        ]);
    }
}
module u_horse_tail() {
    intersection() {
        u_horse_shape();
        u_curve([28.5,16.5],[
            [[40,29],[72,26],[79,11]],
            [[85,-1],[84,-22],[72,-28]],
            [[53,-28],[37,-6],[32,10]],
            [[30,13],[29,15],[28.5,16.5]]
        ]);
    }
}
module u_horse_dark() {
    difference() {
        union() {
            u_horse_mane();
            u_horse_tail();
            if(unicorn_eye_style=="open") {
                translate([-42.8,40.65]) rotate(-22) scale([1.95,2.55]) circle(r=1,$fn=48);
                if(unicorn_eye_lashes) u_stroke([[-41.35,42.0],[-40.55,42.55],[-40.1,43.1]],0.72);
            } else {
                u_stroke([for(t=[0:0.05:1]) u_bezier([-45.0,41.4],[-43.5,39.5],[-41.5,39.65],[-39.8,41.5],t)],1.05);
                if(unicorn_eye_lashes) u_stroke([[-40.6,40.9],[-39.4,42.1]],0.75);
            }
            translate([-50.1,31.3]) rotate(-25) scale([1.2,0.7]) circle(r=1,$fn=28);
            u_stroke([for(t=[0:0.05:1]) u_bezier([-51.0, 28.1],[-49.5, 27.25],[-47.5, 27.4],[-46.25, 28.8],t)],0.95);
            polygon([[-57,-21],[-49,-20],[-48,-31],[-58,-31]]);
            polygon([[-41,-49],[-30,-49],[-30,-57],[-41,-57]]);
            polygon([[4,-51],[13,-51],[13,-57],[4,-57]]);
            polygon([[49,-47],[59,-45],[61,-53],[53,-56]]);
        }
        u_horse_horn();
    }
}
module u_horse_highlights() {
    if(unicorn_eye_style=="open") translate([-43.35,41.55]) circle(r=0.78,$fn=32);
    for(t=[0.26,0.48,0.70]) {
        p=[-75+26*t,71.64-20*t];
        translate(p) rotate(-55) square([4.5,0.85],center=true);
    }
    u_stroke([for(t=[0:0.05:1]) u_bezier([-35,54],[-21,54],[-17,43],[-15,36],t)],1.45);
    u_stroke([for(t=[0:0.05:1]) u_bezier([-15,33],[-15,27],[-10,24],[-5,23],t)],1.45);
    u_stroke([for(t=[0:0.05:1]) u_bezier([36,17],[48,23],[48,8],[56,6],t)],1.6);
    u_stroke([for(t=[0:0.05:1]) u_bezier([45,8],[43,-1],[58,-4],[61,-13],t)],1.6);
    u_stroke([for(t=[0:0.05:1]) u_bezier([60,-9],[61,-16],[69,-15],[72,-19],t)],1.4);
}
module u_horse_star_space() {
    difference() {
        intersection() { offset(delta=-1.2) u_horse_shape(); translate([-3,3]) square([54,30],center=true); }
        if(has_text) scale([1/u_fs,1/u_fs]) offset(delta=0.8+u_outline) u_name();
        offset(delta=1) u_horse_dark();
    }
}
module u_horse_gold() {
    u_horse_horn();
    if(unicorn_show_stars)
        for(star=[[-21,13,2.3],[-8,15,2], [7,14,2.8],[21,12,2.1],[19,-8,2.2]])
            let(p=[star[0],star[1]],r=star[2])
                if(r*u_fs>=1.4)
                    u_whole_star(p,r);
}

// The full horse and both head layouts share one silhouette and artwork.
module u_head_region() {
    polygon([[-85,80],[4,80],[4,21],[0,19],[-8,17],[-21,16],[-36,17],[-85,17]]);
}
module u_head_local() {
    translate([37.5,-20]) intersection() { u_head_region(); children(); }
}
module u_head_shape() {
    u_head_local() u_horse_shape();
}
module u_head_dark() {
    difference() {
        union() {
            u_head_local() u_horse_dark();
            // Outline makes the pale head legible against the plate.
            if(u_inside) difference() { u_head_shape(); offset(delta=-1.05) u_head_shape(); }
        }
        u_head_gold();
    }
}
module u_head_gold() {
    u_head_local() u_horse_horn();
}
module u_head_highlights() {
    u_head_local() u_horse_highlights();
}
